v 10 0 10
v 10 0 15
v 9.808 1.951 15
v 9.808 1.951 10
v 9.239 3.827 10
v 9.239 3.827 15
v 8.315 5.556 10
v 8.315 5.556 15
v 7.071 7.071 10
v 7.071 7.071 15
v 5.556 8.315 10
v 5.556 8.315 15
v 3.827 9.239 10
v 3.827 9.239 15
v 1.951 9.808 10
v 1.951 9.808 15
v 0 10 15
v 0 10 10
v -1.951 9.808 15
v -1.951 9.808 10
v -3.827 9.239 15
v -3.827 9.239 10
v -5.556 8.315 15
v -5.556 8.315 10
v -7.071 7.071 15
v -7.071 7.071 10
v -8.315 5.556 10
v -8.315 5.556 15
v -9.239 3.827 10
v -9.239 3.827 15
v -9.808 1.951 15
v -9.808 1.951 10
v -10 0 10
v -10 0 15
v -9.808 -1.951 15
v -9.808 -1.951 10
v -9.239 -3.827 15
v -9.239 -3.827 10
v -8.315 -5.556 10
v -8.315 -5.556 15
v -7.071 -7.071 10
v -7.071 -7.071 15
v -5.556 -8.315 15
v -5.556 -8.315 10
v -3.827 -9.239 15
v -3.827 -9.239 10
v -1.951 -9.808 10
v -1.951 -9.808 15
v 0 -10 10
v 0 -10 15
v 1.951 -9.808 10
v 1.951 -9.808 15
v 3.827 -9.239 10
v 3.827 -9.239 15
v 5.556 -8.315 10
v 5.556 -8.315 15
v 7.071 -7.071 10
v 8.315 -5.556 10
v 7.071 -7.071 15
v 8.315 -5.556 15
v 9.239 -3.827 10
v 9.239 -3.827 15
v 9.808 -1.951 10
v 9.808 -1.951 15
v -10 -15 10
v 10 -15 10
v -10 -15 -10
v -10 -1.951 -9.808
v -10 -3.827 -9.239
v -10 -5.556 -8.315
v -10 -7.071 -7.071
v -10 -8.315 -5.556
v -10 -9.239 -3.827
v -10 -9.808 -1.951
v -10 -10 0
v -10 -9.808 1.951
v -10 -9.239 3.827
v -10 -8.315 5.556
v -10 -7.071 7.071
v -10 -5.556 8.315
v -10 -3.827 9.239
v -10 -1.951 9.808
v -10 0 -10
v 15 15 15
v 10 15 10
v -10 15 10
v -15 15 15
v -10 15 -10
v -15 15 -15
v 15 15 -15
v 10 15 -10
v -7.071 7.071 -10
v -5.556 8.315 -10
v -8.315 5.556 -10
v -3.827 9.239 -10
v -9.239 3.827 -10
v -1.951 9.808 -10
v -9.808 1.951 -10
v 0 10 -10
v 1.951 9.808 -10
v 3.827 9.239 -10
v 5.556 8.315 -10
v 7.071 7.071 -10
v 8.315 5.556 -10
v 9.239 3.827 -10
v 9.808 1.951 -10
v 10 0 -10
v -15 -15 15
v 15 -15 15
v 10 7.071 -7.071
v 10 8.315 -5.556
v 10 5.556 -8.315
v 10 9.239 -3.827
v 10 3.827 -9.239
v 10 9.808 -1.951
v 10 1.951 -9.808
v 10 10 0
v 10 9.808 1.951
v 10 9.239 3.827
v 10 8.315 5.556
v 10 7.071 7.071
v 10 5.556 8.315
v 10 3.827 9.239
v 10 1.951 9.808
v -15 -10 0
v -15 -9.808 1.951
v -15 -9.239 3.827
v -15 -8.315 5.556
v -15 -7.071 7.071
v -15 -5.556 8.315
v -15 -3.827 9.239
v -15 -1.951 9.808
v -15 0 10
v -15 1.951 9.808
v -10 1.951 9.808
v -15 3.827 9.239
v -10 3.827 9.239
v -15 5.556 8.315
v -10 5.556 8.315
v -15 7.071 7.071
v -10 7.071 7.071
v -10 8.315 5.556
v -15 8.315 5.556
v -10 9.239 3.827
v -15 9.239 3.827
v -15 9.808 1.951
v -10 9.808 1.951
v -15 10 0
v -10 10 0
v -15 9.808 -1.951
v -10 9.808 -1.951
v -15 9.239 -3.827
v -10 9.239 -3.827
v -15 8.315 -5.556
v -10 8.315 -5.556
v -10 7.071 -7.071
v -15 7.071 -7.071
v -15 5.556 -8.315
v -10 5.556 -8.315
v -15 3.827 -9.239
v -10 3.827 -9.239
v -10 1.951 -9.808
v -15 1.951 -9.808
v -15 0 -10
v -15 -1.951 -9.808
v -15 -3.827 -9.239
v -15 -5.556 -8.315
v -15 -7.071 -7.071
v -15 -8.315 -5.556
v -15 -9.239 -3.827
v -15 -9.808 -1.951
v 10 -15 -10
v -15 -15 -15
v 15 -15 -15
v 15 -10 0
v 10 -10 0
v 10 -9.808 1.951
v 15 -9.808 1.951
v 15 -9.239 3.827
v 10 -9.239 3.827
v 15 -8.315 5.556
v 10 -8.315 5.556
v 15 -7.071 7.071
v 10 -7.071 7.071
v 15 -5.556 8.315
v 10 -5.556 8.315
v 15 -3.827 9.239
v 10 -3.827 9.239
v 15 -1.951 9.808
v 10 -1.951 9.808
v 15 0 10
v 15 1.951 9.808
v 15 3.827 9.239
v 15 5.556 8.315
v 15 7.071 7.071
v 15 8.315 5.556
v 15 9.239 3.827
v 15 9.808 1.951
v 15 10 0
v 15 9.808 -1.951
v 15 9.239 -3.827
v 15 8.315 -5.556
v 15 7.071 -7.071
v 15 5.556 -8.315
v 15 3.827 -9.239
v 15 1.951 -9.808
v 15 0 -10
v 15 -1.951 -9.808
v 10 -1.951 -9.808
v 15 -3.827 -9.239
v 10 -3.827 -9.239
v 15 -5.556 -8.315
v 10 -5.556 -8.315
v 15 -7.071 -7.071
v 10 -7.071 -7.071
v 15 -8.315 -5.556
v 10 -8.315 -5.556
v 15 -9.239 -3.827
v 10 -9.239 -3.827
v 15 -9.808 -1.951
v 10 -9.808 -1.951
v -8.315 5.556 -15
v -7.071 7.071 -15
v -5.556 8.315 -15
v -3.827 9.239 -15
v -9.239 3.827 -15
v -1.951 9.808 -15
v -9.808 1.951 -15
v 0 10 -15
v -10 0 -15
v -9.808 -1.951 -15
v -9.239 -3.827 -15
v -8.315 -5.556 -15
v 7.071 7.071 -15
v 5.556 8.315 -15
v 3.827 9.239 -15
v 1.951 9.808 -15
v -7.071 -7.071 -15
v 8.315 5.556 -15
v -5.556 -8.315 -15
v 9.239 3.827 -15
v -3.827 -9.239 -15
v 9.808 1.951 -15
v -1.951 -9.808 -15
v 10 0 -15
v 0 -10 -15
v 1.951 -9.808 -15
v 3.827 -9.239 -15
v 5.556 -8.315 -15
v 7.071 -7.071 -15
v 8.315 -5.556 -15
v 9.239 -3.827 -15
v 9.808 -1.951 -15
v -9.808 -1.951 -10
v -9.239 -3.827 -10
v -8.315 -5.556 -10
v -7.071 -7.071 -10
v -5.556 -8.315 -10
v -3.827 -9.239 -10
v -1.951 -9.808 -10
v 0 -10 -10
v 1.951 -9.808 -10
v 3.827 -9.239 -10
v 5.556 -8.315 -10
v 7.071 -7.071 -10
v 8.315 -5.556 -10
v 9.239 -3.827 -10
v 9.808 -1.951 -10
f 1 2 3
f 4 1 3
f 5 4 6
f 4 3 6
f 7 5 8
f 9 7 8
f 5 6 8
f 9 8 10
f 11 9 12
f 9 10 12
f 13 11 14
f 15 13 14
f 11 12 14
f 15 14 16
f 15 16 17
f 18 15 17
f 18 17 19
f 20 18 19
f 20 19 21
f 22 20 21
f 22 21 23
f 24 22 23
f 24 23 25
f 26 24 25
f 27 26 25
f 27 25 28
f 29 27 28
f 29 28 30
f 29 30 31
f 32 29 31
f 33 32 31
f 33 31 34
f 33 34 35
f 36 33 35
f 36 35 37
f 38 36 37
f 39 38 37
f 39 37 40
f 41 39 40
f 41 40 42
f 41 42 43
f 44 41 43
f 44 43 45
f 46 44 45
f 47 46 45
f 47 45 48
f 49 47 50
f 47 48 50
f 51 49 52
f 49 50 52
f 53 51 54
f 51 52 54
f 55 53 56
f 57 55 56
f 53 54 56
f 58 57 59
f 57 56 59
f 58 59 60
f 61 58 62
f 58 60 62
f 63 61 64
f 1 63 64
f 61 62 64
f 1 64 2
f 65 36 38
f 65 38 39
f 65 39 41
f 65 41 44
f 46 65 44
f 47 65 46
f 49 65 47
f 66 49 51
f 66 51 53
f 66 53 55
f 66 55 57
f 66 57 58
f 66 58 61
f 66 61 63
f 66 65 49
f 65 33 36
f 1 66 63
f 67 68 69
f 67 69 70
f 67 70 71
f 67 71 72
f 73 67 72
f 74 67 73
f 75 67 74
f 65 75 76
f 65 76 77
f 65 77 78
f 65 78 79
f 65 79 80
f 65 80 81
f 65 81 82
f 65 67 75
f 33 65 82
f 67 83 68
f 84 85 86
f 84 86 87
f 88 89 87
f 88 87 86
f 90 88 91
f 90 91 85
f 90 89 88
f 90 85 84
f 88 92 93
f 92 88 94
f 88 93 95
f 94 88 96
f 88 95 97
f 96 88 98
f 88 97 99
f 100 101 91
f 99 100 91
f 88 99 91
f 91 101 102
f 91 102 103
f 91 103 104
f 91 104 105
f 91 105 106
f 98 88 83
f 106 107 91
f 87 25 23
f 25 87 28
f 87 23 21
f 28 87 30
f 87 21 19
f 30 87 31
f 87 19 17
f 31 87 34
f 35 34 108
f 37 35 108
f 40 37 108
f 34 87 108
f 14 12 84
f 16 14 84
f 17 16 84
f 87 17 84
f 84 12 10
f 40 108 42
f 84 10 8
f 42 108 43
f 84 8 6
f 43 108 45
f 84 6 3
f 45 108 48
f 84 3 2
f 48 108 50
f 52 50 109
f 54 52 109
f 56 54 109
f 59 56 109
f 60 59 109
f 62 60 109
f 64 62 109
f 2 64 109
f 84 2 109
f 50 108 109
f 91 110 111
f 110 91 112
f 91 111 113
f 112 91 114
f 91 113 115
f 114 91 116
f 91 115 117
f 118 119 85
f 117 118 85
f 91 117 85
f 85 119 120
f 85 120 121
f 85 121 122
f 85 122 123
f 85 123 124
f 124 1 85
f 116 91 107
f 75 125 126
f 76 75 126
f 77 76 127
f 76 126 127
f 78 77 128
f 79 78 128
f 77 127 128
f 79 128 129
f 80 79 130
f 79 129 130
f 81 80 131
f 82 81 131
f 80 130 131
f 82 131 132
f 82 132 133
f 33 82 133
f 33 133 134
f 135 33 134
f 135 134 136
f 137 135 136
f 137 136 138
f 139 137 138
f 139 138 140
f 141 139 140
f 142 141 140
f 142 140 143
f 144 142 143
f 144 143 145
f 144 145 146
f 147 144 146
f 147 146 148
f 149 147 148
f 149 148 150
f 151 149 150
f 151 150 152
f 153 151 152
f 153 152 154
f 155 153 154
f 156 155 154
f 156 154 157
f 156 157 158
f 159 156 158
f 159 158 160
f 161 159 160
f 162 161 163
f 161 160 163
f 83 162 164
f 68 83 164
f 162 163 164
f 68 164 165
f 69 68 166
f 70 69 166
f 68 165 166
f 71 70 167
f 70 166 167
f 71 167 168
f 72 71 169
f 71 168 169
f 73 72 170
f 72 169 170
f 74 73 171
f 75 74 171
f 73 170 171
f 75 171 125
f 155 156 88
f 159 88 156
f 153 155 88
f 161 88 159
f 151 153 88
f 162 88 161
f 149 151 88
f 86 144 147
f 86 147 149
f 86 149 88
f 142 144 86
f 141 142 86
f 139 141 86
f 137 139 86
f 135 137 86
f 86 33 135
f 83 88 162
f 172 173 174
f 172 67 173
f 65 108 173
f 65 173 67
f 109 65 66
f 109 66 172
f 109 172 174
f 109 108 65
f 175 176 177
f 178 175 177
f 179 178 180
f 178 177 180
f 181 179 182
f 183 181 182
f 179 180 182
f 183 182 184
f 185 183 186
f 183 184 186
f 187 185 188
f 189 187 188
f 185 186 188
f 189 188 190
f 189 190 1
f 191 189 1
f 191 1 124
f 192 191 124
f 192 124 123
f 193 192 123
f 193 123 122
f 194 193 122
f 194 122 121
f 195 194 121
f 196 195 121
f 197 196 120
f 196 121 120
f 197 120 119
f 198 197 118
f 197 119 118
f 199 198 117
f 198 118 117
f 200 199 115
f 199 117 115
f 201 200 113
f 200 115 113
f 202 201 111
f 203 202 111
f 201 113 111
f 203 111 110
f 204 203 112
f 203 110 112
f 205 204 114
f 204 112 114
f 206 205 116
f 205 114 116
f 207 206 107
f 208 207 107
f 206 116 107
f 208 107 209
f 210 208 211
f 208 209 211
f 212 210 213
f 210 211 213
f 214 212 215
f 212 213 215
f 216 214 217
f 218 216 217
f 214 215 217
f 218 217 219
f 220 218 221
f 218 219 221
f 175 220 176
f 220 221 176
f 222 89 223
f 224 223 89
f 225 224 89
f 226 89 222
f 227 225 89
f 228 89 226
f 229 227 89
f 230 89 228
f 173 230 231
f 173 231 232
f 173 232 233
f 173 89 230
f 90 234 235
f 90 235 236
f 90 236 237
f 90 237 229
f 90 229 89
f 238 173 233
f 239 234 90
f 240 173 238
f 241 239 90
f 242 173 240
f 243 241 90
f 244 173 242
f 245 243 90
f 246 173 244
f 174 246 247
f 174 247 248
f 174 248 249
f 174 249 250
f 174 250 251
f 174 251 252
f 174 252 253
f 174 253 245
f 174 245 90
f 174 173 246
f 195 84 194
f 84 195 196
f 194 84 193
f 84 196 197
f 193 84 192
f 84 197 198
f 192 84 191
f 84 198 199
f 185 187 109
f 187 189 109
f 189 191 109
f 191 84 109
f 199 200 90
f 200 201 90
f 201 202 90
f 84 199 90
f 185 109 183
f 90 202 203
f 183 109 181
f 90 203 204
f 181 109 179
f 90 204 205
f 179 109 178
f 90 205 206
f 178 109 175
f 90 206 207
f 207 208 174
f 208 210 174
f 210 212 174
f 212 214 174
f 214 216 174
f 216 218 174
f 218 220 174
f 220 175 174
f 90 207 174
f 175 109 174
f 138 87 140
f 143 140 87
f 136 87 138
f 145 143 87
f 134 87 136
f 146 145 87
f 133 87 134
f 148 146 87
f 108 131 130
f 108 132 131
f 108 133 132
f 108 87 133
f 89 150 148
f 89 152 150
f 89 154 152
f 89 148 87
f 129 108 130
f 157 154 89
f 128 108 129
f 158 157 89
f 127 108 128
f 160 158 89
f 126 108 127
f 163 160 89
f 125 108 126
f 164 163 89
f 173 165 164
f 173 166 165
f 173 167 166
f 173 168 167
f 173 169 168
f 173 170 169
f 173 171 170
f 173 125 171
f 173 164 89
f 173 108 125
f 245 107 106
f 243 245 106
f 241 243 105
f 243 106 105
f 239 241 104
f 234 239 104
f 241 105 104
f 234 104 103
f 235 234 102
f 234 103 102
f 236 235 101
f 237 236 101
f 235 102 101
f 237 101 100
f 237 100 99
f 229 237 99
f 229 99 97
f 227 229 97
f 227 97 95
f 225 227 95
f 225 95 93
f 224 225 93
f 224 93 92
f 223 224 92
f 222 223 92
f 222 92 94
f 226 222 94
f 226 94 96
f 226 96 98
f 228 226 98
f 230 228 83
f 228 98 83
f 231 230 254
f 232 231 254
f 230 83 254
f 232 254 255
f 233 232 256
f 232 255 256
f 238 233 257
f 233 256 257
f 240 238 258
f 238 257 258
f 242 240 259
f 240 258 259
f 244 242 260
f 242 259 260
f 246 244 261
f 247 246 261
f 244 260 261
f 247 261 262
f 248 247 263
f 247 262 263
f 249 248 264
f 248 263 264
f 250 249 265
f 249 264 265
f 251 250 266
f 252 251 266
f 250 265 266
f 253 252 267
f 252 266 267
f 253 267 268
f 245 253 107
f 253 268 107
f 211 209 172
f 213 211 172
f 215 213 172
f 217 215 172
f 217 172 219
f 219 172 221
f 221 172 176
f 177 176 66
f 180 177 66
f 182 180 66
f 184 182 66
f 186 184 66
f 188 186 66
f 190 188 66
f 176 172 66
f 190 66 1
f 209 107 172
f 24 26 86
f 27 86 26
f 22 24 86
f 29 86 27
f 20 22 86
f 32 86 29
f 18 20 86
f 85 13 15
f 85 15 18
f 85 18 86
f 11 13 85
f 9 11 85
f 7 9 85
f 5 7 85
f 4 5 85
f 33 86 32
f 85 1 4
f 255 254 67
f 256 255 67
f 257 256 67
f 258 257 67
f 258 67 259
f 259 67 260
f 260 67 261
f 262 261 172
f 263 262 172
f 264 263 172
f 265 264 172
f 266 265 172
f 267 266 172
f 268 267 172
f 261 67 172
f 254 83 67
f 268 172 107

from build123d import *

# Parameters (mm, degrees)
F0_W      = 30
F0_H      = 30
F1_DEPTH  = 15
F1_FACE_W = 30
F1_FACE_H = 30
F2_DEPTH  = 15
F3_W      = 20
F3_H      = 20
F4_DEPTH  = 30.001
F5_R      = 10
F6_DEPTH  = 30.001
F7_R      = 10
F8_DEPTH  = 30.001


with BuildPart() as f1:
    # F0 (on Front) → F1 (new body)
    with BuildSketch(Plane.XZ):
        Rectangle(F0_W, F0_H)
    extrude(amount=F1_DEPTH)

    # F1_face (on face) → F2 (join)
    with BuildSketch(Plane(origin=(0, 0, 0), x_dir=(1, 0, 0), z_dir=(0, 1, 0))):
        Rectangle(F1_FACE_W, F1_FACE_H)
    extrude(amount=F2_DEPTH)

    # F3 (on face) → F4 (cut, through all)
    with BuildSketch(Plane.XZ.offset(15)):
        Rectangle(F3_W, F3_H)
    extrude(amount=-F4_DEPTH, mode=Mode.SUBTRACT)

    # F5 (on face) → F6 (cut, through all)
    with BuildSketch(Plane.XY.offset(15)):
        Circle(F5_R)
    extrude(amount=-F6_DEPTH, mode=Mode.SUBTRACT)

    # F7 (on face) → F8 (cut, through all)
    with BuildSketch(Plane(origin=(-15, 0, 0), x_dir=(0, -1, 0), z_dir=(-1, 0, 0))):
        Circle(F7_R)
    extrude(amount=-F8_DEPTH, mode=Mode.SUBTRACT)


solid = f1.part
